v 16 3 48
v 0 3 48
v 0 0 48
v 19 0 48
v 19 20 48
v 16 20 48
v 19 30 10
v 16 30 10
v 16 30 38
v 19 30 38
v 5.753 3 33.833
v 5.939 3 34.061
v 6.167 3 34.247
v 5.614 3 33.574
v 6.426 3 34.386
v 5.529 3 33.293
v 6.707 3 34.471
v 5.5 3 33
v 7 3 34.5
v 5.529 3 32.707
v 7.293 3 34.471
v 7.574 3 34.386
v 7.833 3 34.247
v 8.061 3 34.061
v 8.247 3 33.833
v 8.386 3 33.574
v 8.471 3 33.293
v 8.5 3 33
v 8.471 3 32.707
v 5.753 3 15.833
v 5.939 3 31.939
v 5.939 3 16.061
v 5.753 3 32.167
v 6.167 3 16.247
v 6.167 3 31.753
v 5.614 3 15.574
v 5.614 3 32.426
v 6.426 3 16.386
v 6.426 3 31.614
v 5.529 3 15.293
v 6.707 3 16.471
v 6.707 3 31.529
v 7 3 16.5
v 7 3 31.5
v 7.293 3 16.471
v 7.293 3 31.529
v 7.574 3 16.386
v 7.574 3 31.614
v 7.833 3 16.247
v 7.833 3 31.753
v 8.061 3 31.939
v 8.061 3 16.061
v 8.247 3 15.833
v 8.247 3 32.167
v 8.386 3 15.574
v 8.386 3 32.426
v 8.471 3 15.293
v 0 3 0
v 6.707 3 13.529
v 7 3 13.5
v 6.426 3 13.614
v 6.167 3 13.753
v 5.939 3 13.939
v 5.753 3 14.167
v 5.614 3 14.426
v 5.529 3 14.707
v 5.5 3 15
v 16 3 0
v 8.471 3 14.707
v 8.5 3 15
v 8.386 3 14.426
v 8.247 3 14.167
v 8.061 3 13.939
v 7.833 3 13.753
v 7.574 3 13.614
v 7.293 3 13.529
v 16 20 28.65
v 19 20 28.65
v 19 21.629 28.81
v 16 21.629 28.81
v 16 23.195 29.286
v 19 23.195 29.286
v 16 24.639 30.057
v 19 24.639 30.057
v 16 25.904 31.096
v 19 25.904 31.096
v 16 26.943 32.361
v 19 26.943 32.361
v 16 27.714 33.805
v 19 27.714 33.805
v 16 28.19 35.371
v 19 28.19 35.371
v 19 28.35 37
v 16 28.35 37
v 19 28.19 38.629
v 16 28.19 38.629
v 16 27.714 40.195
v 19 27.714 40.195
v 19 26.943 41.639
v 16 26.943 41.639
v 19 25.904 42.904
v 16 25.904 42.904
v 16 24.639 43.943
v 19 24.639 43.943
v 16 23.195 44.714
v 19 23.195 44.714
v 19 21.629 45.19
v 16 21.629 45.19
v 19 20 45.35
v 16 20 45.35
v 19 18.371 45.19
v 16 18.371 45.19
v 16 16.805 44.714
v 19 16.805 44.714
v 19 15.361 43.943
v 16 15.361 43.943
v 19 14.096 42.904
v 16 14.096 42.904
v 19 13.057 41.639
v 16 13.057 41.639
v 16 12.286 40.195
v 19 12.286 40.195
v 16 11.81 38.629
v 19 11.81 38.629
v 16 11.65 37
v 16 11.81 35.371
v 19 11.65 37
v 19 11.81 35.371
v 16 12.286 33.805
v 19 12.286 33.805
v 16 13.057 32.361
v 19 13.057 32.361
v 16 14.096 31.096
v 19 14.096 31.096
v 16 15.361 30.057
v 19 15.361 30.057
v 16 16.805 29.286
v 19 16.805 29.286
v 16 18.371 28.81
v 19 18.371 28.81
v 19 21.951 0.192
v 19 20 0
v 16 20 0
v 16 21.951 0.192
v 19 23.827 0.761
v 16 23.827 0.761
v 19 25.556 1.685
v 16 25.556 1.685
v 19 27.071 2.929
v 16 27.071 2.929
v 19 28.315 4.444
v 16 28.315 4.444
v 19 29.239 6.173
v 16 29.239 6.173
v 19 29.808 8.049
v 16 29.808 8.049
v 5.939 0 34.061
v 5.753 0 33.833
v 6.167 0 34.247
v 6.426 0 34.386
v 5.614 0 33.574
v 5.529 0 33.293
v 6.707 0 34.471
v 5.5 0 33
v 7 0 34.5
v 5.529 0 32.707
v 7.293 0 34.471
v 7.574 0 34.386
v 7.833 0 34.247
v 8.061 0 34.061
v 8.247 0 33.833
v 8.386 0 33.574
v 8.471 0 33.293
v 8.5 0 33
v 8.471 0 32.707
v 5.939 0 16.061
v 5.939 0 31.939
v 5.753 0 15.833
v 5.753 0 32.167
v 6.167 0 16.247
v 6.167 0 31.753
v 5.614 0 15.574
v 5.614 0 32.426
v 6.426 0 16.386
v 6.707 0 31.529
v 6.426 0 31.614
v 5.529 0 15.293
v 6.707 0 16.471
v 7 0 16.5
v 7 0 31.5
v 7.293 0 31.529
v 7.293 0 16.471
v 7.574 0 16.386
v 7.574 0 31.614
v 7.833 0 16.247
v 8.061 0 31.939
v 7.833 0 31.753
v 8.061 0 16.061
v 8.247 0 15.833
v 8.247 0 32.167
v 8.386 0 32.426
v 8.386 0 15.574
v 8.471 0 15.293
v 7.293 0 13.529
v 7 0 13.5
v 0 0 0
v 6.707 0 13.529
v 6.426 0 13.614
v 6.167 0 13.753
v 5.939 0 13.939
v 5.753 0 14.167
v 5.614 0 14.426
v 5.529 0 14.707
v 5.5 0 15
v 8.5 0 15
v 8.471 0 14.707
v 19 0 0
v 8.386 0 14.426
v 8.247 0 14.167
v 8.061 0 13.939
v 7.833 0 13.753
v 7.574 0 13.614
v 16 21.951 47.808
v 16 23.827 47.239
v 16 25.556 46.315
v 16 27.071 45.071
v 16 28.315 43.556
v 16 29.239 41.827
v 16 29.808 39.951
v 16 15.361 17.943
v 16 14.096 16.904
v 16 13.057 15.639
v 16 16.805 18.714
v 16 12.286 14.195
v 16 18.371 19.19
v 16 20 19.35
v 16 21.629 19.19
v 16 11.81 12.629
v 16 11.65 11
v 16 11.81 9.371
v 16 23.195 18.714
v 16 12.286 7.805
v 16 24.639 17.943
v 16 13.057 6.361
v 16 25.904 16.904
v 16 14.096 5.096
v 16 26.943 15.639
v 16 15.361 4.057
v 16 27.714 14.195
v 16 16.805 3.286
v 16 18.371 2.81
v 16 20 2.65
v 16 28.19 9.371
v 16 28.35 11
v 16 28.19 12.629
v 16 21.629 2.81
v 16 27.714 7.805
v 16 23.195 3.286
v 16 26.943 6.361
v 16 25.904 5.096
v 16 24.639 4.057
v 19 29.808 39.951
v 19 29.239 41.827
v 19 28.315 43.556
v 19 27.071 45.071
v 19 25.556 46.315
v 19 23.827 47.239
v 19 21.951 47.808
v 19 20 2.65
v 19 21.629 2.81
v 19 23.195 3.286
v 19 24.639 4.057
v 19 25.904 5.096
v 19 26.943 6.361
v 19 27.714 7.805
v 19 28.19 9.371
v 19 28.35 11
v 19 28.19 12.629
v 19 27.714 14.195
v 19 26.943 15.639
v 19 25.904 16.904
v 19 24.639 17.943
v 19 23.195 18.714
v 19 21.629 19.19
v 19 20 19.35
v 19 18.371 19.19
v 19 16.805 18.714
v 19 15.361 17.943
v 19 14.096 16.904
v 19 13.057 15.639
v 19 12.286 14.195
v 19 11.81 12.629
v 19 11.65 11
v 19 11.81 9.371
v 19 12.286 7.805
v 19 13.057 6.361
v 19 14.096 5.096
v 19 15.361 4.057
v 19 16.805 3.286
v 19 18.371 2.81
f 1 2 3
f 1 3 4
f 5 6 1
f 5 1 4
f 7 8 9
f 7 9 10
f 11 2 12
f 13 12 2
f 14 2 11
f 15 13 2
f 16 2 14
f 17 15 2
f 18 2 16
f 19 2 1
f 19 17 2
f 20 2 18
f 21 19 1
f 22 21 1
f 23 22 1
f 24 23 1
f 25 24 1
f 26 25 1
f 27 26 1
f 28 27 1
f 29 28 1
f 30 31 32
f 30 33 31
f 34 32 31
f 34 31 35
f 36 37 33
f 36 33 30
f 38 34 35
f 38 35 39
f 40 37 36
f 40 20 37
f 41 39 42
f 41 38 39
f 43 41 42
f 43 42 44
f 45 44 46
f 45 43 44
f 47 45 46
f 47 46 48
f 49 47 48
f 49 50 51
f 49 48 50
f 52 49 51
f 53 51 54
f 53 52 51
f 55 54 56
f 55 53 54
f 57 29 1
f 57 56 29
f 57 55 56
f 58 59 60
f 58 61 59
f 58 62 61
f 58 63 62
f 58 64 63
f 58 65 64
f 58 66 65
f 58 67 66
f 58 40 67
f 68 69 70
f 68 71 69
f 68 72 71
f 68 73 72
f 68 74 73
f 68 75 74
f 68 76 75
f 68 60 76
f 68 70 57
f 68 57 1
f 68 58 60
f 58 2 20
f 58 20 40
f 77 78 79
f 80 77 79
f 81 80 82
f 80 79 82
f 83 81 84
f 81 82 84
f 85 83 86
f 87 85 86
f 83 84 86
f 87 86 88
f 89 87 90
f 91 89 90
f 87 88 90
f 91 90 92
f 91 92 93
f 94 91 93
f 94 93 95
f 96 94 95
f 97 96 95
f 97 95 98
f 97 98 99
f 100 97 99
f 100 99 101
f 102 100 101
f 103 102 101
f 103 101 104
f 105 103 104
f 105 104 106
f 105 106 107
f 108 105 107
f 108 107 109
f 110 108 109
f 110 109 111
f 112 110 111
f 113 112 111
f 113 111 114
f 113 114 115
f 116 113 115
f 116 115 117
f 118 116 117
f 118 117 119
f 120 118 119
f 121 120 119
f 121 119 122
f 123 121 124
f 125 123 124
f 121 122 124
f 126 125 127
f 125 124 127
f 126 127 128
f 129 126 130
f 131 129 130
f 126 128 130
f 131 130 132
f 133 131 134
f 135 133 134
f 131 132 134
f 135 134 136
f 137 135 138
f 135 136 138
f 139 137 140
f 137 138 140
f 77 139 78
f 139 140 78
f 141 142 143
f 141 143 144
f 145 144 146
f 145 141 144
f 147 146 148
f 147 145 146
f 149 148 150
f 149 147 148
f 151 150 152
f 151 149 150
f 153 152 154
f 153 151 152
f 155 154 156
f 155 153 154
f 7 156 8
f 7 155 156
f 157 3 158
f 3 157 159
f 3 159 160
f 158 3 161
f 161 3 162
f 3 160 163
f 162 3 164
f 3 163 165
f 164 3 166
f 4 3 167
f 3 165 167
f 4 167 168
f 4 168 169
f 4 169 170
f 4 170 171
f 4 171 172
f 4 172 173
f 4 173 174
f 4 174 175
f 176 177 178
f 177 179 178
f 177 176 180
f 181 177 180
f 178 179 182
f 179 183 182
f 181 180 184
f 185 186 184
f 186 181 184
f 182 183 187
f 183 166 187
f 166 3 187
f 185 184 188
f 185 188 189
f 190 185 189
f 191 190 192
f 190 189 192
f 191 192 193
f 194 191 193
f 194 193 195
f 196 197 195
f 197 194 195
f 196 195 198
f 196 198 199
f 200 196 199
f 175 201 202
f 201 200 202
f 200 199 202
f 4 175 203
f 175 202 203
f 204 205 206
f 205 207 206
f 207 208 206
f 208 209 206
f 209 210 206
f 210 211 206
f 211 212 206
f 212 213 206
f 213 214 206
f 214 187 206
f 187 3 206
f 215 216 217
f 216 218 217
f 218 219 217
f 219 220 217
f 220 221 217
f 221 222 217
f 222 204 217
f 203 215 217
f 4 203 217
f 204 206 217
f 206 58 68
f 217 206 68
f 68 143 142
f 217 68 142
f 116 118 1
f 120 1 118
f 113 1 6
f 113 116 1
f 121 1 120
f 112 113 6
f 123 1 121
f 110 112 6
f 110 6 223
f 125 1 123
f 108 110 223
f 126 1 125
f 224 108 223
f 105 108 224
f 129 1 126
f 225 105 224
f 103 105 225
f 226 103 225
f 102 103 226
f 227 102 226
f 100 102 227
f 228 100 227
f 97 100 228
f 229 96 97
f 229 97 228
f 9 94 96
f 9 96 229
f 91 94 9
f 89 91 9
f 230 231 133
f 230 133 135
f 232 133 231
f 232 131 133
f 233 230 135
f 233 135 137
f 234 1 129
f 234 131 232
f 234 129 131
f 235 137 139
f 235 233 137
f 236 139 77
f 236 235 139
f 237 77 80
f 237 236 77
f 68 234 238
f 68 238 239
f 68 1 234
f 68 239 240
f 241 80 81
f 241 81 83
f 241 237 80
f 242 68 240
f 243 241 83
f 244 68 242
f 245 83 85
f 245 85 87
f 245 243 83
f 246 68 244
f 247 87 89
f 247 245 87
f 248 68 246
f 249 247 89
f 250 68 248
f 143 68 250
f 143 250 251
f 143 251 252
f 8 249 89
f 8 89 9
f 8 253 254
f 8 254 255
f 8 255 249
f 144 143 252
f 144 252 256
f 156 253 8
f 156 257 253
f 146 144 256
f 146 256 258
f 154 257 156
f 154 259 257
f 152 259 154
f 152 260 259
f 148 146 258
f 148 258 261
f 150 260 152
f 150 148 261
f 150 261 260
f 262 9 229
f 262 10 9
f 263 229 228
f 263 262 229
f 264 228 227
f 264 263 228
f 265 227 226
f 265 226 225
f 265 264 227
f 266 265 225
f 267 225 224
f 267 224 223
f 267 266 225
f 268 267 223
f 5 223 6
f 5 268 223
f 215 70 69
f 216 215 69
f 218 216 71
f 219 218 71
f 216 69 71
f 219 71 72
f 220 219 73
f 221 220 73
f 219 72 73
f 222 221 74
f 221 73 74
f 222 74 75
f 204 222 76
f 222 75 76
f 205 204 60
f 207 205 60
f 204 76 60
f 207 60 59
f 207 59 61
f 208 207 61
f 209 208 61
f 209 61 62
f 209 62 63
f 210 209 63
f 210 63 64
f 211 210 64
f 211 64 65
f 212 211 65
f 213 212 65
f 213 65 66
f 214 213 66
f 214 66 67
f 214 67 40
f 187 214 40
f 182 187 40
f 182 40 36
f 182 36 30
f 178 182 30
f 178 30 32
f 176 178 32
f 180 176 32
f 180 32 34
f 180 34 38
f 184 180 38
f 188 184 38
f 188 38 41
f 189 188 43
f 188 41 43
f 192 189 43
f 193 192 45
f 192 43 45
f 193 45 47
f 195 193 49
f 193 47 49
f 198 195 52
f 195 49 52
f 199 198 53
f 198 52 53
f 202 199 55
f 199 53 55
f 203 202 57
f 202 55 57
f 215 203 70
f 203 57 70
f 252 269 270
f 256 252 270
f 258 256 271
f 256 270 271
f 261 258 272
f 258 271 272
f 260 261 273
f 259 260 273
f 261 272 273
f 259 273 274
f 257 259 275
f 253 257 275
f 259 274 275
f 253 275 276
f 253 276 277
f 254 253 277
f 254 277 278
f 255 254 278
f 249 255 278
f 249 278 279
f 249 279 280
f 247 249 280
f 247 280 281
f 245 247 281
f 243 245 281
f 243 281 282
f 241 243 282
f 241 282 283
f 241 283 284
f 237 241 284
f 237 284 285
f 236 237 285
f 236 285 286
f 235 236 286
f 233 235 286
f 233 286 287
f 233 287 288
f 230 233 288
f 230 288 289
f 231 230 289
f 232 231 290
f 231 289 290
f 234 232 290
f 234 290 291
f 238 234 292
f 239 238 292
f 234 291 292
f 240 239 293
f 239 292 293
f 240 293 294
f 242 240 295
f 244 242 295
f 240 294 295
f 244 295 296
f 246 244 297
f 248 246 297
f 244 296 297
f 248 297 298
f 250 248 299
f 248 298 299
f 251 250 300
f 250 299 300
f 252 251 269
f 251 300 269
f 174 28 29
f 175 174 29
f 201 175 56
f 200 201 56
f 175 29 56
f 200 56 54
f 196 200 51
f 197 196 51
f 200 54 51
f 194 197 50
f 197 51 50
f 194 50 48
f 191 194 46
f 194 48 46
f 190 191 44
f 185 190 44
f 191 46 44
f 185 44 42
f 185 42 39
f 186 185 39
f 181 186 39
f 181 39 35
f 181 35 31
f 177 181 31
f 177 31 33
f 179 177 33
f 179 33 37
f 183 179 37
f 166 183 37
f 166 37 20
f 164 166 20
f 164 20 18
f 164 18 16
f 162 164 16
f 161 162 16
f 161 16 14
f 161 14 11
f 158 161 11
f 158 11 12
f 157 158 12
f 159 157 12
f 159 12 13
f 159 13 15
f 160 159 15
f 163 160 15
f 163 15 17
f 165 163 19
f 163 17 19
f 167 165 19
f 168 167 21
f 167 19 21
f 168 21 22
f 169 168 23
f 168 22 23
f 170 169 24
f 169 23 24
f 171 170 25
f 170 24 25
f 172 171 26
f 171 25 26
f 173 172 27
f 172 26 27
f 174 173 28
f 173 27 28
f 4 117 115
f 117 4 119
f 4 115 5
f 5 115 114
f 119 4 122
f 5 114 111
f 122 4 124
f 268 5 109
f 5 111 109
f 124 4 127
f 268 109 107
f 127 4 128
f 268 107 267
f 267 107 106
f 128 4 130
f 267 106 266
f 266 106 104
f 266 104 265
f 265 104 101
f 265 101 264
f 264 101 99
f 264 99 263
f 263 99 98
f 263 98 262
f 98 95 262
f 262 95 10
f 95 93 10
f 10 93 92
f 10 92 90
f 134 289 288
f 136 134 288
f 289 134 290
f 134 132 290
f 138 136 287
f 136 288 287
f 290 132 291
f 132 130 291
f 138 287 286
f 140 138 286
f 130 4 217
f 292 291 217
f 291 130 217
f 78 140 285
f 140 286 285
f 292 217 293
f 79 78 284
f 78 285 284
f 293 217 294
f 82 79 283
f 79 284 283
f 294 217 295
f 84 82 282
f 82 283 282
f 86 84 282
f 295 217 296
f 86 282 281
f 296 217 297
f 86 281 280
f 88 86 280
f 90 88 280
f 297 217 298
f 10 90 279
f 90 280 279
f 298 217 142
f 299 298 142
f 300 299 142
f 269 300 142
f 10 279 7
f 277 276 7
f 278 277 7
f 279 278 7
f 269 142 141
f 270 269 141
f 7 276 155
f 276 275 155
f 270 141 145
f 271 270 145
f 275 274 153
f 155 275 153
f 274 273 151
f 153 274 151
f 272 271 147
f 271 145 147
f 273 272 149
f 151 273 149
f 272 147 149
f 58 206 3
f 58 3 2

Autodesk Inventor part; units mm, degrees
ref_plane "YZ Plane" through (0, 0, 0) normal (1, 0, 0) x (0, 1, 0)
ref_plane "XZ Plane" through (0, 0, 0) normal (0, 1, 0) x (-1, 0, 0)
ref_plane "XY Plane" through (0, 0, 0) normal (0, 0, 1) x (1, 0, 0)
sketch "Sketch1" plane through (0, 0, 0) normal (0, 0, 1) x (1, 0, 0)
  line L0 (0, 0) -> (0, 3)
  line L1 (0, 3) -> (16, 3)
  line L2 (0, 0) -> (19, 0)
  line L3 (19, 0) -> (19, 30)
  line L4 (16, 3) -> (16, 30)
  line L5 (16, 30) -> (19, 30)
  dimension "d0" = 3
  dimension "d1" = 16
  dimension "d2" = 19
  dimension "d3" = 30
extrude "Extrusion1" add sketch "Sketch1" along normal blind 48
fillet "Fillet1" radius 10 2 edges at (17.5, 30, 0) (17.5, 30, 48)
sketch "Sketch2" plane through (19, 0, 48) normal (1, 0, 0) x (0, 0, -1)
  circle A0 centre (11, 20) radius 8.35
  circle A1 centre (37, 20) radius 8.35
  line L0 (48, 20) -> (48, 0) projected
  line L1 (38, 30) -> (10, 30) projected
  line L2 (0, 0) -> (0, 20) projected
  dimension "d7" = 16.7
  dimension "d8" = 16.7
  dimension "d9" = 11
  dimension "d10" = 10
  dimension "d11" = 10
  dimension "d12" = 11
extrude "Extrusion2" cut sketch "Sketch2" against normal blind 48
sketch "Sketch3" plane through (0, 3, 0) normal (0, 1, 0) x (1, 0, 0)
  circle A0 centre (7, -33) radius 1.5
  circle A1 centre (7, -15) radius 1.5
  line L0 (0, 0) -> (16, 0) projected
  line L1 (16, -48) -> (0, -48) projected
  line L2 (0, 0) -> (0, -48) projected
  dimension "d15" = 3
  dimension "d16" = 3
  dimension "d17" = 15
  dimension "d18" = 15
  dimension "d19" = 7
  dimension "d20" = 7
extrude "Extrusion3" cut sketch "Sketch3" against normal blind 48
